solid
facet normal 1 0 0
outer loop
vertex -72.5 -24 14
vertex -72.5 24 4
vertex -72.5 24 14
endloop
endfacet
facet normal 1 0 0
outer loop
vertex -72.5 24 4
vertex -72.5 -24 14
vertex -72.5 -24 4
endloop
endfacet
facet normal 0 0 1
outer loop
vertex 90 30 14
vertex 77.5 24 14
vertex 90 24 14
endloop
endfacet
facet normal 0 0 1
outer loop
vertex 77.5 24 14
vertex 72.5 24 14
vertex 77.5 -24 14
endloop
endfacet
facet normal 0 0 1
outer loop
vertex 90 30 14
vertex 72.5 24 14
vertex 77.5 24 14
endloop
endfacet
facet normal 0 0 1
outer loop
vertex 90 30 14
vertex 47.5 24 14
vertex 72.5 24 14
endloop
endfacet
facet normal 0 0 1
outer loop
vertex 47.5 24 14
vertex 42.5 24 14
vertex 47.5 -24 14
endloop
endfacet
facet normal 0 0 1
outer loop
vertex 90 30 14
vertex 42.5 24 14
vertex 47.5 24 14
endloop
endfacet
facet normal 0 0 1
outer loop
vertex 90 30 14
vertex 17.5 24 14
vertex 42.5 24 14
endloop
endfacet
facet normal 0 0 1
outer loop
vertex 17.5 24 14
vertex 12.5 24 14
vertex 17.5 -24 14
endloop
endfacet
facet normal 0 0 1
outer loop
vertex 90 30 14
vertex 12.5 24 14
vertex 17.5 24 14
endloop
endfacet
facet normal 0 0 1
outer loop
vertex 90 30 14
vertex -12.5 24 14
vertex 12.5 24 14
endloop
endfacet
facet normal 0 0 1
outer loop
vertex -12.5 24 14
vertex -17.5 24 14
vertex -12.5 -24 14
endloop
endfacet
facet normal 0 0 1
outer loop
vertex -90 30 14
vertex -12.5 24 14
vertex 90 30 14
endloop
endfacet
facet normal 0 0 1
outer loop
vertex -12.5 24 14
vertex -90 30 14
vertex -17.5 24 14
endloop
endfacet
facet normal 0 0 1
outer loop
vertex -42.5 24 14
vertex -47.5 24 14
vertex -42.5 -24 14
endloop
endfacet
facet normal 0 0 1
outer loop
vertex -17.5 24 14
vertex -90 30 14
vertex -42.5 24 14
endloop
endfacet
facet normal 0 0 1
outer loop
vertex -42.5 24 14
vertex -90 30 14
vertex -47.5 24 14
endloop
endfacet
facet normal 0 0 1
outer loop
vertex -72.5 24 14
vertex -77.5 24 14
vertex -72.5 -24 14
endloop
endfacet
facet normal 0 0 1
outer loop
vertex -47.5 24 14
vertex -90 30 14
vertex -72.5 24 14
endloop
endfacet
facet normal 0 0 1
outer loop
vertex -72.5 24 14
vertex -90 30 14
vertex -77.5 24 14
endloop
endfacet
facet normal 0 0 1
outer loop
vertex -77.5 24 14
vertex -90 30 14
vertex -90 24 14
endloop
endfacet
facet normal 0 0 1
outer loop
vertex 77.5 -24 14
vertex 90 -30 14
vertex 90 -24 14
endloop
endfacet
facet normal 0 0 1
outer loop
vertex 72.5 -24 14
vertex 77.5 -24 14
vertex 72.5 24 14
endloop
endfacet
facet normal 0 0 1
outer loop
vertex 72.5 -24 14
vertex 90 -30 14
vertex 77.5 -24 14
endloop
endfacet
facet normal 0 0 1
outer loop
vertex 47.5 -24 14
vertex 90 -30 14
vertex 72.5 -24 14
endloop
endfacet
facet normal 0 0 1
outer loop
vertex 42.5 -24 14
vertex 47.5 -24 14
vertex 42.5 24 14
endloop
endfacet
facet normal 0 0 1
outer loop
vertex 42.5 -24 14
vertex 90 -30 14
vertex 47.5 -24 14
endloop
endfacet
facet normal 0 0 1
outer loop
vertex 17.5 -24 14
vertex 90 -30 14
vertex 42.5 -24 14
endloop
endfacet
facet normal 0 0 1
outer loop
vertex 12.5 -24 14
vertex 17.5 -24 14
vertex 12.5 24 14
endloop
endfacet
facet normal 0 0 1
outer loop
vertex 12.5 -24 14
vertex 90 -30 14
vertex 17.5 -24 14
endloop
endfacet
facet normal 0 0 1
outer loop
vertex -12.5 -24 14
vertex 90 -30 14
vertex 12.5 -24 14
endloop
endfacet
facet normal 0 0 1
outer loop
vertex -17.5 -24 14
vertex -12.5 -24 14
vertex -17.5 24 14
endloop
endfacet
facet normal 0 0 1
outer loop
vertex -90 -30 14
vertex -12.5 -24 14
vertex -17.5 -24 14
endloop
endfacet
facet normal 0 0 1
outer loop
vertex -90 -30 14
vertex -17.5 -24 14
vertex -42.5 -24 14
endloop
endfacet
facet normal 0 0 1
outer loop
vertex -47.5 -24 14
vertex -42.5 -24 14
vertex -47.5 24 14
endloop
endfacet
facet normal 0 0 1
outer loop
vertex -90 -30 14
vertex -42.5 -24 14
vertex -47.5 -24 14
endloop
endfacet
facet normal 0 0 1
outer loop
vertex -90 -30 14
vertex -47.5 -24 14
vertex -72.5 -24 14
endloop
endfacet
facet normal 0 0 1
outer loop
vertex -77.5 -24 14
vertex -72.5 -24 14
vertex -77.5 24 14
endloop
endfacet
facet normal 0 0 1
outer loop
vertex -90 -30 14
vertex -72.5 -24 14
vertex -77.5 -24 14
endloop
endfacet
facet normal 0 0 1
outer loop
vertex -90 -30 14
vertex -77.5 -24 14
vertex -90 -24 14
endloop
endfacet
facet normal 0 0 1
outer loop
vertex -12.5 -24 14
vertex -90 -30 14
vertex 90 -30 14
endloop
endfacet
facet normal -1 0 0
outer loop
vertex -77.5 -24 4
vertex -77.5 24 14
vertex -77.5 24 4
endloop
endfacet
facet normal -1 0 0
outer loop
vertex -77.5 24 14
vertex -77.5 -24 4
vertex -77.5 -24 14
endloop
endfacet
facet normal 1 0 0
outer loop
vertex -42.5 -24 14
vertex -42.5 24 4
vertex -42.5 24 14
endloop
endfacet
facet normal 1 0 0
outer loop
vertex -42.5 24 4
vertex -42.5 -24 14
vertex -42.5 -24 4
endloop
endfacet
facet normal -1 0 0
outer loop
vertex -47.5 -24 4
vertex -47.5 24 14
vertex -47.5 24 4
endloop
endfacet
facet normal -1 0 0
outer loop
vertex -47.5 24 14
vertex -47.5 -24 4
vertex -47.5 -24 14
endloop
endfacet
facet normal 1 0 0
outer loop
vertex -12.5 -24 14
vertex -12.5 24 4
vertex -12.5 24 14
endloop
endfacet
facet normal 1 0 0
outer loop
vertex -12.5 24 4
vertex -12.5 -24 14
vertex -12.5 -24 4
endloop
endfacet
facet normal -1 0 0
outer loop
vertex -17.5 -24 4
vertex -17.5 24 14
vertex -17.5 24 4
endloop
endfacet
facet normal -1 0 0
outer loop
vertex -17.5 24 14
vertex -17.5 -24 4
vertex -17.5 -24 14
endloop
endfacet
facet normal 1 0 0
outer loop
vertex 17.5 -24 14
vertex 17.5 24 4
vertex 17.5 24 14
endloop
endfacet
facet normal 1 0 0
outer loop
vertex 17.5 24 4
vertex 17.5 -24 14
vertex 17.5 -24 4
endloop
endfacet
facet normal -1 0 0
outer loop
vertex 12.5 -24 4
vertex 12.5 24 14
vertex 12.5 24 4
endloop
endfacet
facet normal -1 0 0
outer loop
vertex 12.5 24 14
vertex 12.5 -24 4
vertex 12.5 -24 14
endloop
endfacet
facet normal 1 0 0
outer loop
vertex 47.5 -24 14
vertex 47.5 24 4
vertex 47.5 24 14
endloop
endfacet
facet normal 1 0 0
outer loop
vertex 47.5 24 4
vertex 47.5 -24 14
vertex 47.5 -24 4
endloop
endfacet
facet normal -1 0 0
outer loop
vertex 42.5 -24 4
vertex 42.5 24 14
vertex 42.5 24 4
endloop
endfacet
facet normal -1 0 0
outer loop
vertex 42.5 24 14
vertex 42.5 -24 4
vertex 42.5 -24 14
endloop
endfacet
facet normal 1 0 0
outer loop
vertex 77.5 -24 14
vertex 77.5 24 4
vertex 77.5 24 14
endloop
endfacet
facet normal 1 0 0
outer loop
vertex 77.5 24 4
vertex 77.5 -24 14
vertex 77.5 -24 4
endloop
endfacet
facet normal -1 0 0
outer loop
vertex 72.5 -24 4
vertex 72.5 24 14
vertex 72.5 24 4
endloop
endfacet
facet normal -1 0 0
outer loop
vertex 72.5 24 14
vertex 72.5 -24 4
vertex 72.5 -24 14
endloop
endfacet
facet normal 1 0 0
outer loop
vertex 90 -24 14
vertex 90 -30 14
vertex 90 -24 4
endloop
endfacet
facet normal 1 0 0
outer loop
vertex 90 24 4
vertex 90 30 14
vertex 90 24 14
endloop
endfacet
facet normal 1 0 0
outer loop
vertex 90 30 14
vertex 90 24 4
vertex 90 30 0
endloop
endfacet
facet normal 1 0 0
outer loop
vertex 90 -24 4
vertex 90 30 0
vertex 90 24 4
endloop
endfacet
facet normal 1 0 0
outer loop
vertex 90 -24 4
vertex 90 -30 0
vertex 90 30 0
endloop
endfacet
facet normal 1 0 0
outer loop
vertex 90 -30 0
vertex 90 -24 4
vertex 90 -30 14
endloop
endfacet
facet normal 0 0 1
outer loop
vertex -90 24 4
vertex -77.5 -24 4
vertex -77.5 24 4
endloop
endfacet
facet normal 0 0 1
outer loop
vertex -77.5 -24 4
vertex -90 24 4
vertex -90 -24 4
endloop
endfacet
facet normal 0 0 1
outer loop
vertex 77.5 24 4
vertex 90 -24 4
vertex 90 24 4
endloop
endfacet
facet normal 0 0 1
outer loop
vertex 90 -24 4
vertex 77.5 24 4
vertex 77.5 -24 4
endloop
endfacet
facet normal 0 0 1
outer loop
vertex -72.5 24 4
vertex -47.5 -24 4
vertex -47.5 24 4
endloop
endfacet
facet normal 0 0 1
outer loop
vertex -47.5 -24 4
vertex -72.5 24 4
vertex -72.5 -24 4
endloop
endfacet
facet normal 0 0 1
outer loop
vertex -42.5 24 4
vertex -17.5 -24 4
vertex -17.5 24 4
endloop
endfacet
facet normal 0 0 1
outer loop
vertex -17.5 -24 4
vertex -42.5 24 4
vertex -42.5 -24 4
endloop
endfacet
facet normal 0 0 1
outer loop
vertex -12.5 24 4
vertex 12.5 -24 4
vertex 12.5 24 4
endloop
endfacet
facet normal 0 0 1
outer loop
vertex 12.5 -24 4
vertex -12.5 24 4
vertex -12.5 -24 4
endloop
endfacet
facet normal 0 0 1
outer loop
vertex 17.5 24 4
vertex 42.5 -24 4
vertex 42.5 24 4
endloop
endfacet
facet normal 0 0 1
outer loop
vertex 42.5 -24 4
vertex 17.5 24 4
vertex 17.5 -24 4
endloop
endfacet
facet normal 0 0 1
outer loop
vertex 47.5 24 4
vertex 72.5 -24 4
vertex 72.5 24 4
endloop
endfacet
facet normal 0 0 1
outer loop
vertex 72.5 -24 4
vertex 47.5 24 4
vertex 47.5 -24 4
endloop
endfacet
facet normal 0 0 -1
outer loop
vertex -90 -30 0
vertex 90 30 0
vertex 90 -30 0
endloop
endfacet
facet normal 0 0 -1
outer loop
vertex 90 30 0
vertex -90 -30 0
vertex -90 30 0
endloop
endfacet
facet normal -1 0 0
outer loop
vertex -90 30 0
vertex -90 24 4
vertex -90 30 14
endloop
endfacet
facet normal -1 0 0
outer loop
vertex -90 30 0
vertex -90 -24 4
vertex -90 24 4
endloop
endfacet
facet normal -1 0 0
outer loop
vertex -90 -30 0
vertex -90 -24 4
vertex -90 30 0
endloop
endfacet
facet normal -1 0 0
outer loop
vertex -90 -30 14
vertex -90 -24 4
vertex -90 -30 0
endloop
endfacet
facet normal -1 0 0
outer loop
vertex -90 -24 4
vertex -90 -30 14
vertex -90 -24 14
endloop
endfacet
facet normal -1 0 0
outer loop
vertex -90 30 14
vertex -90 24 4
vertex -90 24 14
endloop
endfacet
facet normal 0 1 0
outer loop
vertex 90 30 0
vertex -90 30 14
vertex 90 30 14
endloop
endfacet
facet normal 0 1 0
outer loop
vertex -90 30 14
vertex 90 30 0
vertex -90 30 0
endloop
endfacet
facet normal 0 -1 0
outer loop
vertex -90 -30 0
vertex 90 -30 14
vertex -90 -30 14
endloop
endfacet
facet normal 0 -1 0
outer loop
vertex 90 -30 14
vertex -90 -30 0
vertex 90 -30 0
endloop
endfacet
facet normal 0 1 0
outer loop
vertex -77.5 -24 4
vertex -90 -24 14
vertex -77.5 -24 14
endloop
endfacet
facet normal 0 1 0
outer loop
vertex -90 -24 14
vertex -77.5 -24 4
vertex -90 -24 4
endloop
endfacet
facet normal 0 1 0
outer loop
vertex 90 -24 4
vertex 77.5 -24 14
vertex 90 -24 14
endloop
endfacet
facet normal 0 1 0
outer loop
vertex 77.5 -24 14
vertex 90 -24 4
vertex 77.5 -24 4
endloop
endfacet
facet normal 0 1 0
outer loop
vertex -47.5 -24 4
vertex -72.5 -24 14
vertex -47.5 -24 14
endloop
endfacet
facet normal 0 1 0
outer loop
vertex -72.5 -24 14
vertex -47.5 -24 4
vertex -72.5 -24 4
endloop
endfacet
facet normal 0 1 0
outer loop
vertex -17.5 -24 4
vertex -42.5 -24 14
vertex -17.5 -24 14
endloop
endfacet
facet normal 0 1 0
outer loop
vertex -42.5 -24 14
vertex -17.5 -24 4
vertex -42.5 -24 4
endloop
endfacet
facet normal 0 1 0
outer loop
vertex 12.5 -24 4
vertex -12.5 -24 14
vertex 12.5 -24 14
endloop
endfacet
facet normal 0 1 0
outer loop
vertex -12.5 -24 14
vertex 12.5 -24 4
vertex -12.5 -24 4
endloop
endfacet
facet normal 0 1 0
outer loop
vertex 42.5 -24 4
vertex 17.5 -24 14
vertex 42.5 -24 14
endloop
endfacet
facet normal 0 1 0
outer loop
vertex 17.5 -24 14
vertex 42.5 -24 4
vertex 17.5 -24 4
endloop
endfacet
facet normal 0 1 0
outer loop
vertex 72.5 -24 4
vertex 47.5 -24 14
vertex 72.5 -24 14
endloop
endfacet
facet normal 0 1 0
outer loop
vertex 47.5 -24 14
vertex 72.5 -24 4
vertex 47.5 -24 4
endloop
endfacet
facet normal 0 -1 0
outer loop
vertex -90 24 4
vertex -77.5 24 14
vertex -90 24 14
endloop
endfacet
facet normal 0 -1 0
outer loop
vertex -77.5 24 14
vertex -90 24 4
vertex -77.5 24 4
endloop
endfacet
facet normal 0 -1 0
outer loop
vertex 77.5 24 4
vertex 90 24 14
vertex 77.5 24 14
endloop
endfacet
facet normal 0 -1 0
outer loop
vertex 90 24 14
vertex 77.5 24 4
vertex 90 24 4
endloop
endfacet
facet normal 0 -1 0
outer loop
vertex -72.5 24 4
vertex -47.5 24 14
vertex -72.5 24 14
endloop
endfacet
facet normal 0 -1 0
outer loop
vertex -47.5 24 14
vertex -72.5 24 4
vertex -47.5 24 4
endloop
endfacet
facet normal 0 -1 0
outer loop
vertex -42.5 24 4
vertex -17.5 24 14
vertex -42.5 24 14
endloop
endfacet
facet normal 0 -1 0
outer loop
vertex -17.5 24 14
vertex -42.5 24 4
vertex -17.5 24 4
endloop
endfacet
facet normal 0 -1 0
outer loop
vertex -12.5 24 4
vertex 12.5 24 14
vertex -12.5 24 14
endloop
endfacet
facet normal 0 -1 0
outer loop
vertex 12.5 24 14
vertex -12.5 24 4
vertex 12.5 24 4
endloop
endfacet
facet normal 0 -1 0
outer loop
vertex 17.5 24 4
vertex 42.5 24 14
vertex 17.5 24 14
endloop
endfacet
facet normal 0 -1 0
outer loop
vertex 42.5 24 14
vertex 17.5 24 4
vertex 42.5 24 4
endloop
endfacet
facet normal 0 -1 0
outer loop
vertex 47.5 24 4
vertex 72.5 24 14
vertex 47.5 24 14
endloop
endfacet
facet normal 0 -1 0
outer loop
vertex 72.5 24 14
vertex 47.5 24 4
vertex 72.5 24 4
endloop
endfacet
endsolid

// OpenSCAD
$fn = 32;

// ----------------------------------------------------------------------
// Rib frame 180 x 60 x 14
// 6 ribs at 30 mm pitch
// ----------------------------------------------------------------------

// --- parameters (mm) ---
frame = [180, 60, 4];  // base plate size (x, y, z)
rail_w = 6;            // side rail width
ribs = 6;              // number of ribs
rib_t = 5;             // rib thickness
rib_h = 10;            // rib height above the base plate
pitch = 30;            // pitch between rib centres

// --- derived feature positions (mm) ---
span = (ribs - 1) * pitch;          // = 150   distance between the outer ribs
origin_x = -span / 2;               // = -75   X of the first rib
rib_len = frame[1] - 2 * rail_w + 2;  // = 50   rib length, 1 mm into each rail
feature_centers = [
  [origin_x + 0 * pitch, 0],
  [origin_x + 1 * pitch, 0],
  [origin_x + 2 * pitch, 0],
  [origin_x + 3 * pitch, 0],
  [origin_x + 4 * pitch, 0],
  [origin_x + 5 * pitch, 0]
];   // rib centre line, drives the rib loop

// base plate, two side rails, then the ribs read straight off feature_centers
union() {
  translate([-frame[0] / 2, -frame[1] / 2, 0]) cube(frame);
  translate([-frame[0] / 2, -frame[1] / 2, 0]) cube([frame[0], rail_w, frame[2] + rib_h]);
  translate([-frame[0] / 2, frame[1] / 2 - rail_w, 0]) cube([frame[0], rail_w, frame[2] + rib_h]);
  for (centre = feature_centers)
    translate([centre[0] - rib_t / 2, centre[1] - rib_len / 2, frame[2] - 1])
      cube([rib_t, rib_len, rib_h + 1]);
}
